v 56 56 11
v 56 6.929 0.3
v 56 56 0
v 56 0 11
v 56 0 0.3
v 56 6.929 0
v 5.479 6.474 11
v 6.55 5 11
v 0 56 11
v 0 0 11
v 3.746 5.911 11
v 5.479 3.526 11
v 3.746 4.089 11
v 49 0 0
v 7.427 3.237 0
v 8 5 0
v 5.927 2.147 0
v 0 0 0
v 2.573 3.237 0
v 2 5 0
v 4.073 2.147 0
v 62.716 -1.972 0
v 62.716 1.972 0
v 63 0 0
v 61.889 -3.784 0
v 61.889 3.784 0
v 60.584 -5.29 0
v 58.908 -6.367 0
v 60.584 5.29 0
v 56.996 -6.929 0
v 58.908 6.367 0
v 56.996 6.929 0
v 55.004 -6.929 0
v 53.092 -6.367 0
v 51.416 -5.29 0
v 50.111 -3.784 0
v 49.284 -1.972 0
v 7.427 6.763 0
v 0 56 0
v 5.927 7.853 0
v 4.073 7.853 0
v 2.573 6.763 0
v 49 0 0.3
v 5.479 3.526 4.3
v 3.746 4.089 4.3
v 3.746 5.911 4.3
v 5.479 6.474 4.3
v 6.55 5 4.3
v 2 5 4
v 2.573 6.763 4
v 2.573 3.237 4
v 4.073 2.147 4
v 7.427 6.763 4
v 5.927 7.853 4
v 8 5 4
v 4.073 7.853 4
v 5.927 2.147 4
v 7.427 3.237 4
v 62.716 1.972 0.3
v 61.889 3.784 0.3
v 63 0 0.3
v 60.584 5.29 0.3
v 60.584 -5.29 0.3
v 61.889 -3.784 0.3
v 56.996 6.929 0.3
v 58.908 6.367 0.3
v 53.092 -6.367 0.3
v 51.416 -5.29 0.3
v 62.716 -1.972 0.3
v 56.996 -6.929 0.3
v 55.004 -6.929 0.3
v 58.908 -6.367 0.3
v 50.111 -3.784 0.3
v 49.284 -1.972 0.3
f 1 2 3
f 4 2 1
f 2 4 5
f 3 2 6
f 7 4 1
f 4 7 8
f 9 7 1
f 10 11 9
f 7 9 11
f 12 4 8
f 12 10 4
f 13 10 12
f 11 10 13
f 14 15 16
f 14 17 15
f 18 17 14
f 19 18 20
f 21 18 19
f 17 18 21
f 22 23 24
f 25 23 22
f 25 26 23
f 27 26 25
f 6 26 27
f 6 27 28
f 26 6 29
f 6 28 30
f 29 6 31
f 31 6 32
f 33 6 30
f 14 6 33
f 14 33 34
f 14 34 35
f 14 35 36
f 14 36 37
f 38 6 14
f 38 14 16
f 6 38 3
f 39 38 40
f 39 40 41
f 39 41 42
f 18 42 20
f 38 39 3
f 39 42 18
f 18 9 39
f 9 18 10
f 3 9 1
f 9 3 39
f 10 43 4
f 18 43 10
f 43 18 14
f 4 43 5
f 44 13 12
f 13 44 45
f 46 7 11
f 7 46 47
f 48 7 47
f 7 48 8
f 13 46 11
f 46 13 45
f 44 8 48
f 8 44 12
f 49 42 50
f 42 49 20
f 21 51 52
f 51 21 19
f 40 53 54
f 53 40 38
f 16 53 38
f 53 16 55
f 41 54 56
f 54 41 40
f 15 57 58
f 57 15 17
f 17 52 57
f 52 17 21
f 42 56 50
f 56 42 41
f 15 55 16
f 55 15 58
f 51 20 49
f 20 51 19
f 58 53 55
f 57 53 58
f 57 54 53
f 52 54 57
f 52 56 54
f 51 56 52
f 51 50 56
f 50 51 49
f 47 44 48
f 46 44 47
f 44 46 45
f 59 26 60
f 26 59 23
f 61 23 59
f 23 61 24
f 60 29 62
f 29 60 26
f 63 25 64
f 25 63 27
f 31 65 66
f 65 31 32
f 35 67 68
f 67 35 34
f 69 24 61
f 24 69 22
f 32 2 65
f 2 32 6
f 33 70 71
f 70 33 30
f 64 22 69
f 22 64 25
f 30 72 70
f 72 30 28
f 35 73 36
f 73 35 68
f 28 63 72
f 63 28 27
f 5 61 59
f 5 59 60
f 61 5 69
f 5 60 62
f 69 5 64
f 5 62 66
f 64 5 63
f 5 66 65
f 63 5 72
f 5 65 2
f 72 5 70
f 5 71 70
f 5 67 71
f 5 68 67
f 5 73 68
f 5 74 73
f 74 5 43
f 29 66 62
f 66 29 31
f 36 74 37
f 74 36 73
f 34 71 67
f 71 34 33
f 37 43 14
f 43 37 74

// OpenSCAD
// file: shapes.scad
/*
 *  OpenSCAD Shapes Library (www.openscad.at)
 *  Copyright (C) 2009  Catarina Mota <clifford@clifford.at>
 *
 *  This program is free software; you can redistribute it and/or modify
 *  it under the terms of the GNU General Public License as published by
 *  the Free Software Foundation; either version 2 of the License, or
 *  (at your option) any later version.
 *
 *  This program is distributed in the hope that it will be useful,
 *  but WITHOUT ANY WARRANTY; without even the implied warranty of
 *  MERCHANTABILITY or FITNESS FOR A PARTICULAR PURPOSE.  See the
 *  GNU General Public License for more details.
 *
 *  You should have received a copy of the GNU General Public License
 *  along with this program; if not, write to the Free Software
 *  Foundation, Inc., 59 Temple Place, Suite 330, Boston, MA  02111-1307  USA
 *
*/


//box(width, height, depth);
//roundedBox(width, height, depth, factor);
//cone(height, radius);
//oval(width, height, depth);
//tube(height, radius, wall);
//ovalTube(width, height, depth, wall);
//hexagon(height, depth);
//octagon(height, depth);
//dodecagon(height, depth);
//hexagram(height, depth);
//rightTriangle(adjacent, opposite, depth);
//equiTriangle(side, depth);
//12ptStar(height, depth);

//----------------------

//roundedBox(120, 60, 3, 8);

//----------------------

module box(w,h,d) {
	scale ([w,h,d]) cube(1, true);
}

module roundedBox(w,h,d,f){
	difference(){
		box(w,h,d);
		translate([-w/2,h/2,0]) cube(w/(f/2),true);
		translate([w/2,h/2,0]) cube(w/(f/2),true);
		translate([-w/2,-h/2,0]) cube(w/(f/2),true);
		translate([w/2,-h/2,0]) cube(w/(f/2),true);
	}
	translate([-w/2+w/f,h/2-w/f,-d/2]) cylinder(d,w/f, w/f);
	translate([w/2-w/f,h/2-w/f,-d/2]) cylinder(d,w/f, w/f);
	translate([-w/2+w/f,-h/2+w/f,-d/2]) cylinder(d,w/f, w/f);
	translate([w/2-w/f,-h/2+w/f,-d/2]) cylinder(d,w/f, w/f);
}

module cone(height, radius) {
		cylinder(height, radius, 0);
}

module oval(w,h,d) {
	scale ([w/100, h/100, 1]) cylinder(d, 50, 50);
}

module tube(height, radius, wall) {
	difference(){
		cylinder(height, radius, radius);
		cylinder(height, radius-wall, radius-wall);
	}
}

module ovalTube(w,h,d,wall) {
	difference(){
		scale ([w/100, h/100, 1]) cylinder(d, 50, 50);
		scale ([w/100, h/100, 1]) cylinder(d, 50-wall, 50-wall);
	}
}

module hexagon(height, depth) {
	boxWidth=height/1.75;
		union(){
			box(boxWidth, height, depth);
			rotate([0,0,60]) box(boxWidth, height, depth);
			rotate([0,0,-60]) box(boxWidth, height, depth);
		}
}

module octagon(height, depth) {
	intersection(){
		box(height, height, depth);
		rotate([0,0,45]) box(height, height, depth);
	}
}

module dodecagon(height, depth) {
	intersection(){
		hexagon(height, depth);
		rotate([0,0,90]) hexagon(height, depth);
	}
}

module hexagram(height, depth) {
	boxWidth=height/1.75;
	intersection(){
		box(height, boxWidth, depth);
		rotate([0,0,60]) box(height, boxWidth, depth);
	}
	intersection(){
		box(height, boxWidth, depth);
		rotate([0,0,-60]) box(height, boxWidth, depth);
	}
	intersection(){
		rotate([0,0,60]) box(height, boxWidth, depth);
		rotate([0,0,-60]) box(height, boxWidth, depth);
	}
}

module rightTriangle(adjacent, opposite, depth) {
	difference(){
		translate([-adjacent/2,opposite/2,0]) box(adjacent, opposite, depth);
		translate([-adjacent,0,0]){
			rotate([0,0,atan(opposite/adjacent)]) dislocateBox(adjacent*2, opposite, depth);
		}
	}
}

module equiTriangle(side, depth) {
	difference(){
		translate([-side/2,side/2,0]) box(side, side, depth);
		rotate([0,0,30]) dislocateBox(side*2, side, depth);
		translate([-side,0,0]){
			rotate([0,0,60]) dislocateBox(side*2, side, depth);
		}
	}
}

module 12ptStar(height, depth) {
	starNum=3;
	starAngle=360/starNum;
	for (s=[1:starNum]){
		rotate([0, 0, s*starAngle]) box(height, height, depth);
	}
}

//-----------------------
//MOVES THE ROTATION AXIS OF A BOX FROM ITS CENTER TO THE BOTTOM LEFT CORNER
module dislocateBox(w,h,d){
	translate([w/2,h,0]){
		difference(){
			box(w, h*2, d+1);
			translate([-w,0,0]) box(w, h*2, d+1);
		}
	}
}
// main file
//Example upside down recess using bridge

include <shapes.scad>;

		union()
		{ 

			difference() 
			{

// Create a box (co-incidentally, the same size as the OpenTRV box)

			translate([0,0,0]) cube([56,56,11]);

//Subtract a 3.1mm diameter hole all the way through  

			translate([5,5,-1]) cylinder(h = 13, r = 1.55);

//Subtract a 6mm diameter recess 4mm high from the bottom

			translate([5,5,-2]) cylinder(h = 6, r = 3.0);

			}

// Put in the bridge to avoid droop 

			translate([0,0,4]) cube([8,8,0.3]);

// Add Lillypad (aka Mouse Ear)

			translate([56,0,0]) cylinder(h = 0.3, r = 7);

		}
